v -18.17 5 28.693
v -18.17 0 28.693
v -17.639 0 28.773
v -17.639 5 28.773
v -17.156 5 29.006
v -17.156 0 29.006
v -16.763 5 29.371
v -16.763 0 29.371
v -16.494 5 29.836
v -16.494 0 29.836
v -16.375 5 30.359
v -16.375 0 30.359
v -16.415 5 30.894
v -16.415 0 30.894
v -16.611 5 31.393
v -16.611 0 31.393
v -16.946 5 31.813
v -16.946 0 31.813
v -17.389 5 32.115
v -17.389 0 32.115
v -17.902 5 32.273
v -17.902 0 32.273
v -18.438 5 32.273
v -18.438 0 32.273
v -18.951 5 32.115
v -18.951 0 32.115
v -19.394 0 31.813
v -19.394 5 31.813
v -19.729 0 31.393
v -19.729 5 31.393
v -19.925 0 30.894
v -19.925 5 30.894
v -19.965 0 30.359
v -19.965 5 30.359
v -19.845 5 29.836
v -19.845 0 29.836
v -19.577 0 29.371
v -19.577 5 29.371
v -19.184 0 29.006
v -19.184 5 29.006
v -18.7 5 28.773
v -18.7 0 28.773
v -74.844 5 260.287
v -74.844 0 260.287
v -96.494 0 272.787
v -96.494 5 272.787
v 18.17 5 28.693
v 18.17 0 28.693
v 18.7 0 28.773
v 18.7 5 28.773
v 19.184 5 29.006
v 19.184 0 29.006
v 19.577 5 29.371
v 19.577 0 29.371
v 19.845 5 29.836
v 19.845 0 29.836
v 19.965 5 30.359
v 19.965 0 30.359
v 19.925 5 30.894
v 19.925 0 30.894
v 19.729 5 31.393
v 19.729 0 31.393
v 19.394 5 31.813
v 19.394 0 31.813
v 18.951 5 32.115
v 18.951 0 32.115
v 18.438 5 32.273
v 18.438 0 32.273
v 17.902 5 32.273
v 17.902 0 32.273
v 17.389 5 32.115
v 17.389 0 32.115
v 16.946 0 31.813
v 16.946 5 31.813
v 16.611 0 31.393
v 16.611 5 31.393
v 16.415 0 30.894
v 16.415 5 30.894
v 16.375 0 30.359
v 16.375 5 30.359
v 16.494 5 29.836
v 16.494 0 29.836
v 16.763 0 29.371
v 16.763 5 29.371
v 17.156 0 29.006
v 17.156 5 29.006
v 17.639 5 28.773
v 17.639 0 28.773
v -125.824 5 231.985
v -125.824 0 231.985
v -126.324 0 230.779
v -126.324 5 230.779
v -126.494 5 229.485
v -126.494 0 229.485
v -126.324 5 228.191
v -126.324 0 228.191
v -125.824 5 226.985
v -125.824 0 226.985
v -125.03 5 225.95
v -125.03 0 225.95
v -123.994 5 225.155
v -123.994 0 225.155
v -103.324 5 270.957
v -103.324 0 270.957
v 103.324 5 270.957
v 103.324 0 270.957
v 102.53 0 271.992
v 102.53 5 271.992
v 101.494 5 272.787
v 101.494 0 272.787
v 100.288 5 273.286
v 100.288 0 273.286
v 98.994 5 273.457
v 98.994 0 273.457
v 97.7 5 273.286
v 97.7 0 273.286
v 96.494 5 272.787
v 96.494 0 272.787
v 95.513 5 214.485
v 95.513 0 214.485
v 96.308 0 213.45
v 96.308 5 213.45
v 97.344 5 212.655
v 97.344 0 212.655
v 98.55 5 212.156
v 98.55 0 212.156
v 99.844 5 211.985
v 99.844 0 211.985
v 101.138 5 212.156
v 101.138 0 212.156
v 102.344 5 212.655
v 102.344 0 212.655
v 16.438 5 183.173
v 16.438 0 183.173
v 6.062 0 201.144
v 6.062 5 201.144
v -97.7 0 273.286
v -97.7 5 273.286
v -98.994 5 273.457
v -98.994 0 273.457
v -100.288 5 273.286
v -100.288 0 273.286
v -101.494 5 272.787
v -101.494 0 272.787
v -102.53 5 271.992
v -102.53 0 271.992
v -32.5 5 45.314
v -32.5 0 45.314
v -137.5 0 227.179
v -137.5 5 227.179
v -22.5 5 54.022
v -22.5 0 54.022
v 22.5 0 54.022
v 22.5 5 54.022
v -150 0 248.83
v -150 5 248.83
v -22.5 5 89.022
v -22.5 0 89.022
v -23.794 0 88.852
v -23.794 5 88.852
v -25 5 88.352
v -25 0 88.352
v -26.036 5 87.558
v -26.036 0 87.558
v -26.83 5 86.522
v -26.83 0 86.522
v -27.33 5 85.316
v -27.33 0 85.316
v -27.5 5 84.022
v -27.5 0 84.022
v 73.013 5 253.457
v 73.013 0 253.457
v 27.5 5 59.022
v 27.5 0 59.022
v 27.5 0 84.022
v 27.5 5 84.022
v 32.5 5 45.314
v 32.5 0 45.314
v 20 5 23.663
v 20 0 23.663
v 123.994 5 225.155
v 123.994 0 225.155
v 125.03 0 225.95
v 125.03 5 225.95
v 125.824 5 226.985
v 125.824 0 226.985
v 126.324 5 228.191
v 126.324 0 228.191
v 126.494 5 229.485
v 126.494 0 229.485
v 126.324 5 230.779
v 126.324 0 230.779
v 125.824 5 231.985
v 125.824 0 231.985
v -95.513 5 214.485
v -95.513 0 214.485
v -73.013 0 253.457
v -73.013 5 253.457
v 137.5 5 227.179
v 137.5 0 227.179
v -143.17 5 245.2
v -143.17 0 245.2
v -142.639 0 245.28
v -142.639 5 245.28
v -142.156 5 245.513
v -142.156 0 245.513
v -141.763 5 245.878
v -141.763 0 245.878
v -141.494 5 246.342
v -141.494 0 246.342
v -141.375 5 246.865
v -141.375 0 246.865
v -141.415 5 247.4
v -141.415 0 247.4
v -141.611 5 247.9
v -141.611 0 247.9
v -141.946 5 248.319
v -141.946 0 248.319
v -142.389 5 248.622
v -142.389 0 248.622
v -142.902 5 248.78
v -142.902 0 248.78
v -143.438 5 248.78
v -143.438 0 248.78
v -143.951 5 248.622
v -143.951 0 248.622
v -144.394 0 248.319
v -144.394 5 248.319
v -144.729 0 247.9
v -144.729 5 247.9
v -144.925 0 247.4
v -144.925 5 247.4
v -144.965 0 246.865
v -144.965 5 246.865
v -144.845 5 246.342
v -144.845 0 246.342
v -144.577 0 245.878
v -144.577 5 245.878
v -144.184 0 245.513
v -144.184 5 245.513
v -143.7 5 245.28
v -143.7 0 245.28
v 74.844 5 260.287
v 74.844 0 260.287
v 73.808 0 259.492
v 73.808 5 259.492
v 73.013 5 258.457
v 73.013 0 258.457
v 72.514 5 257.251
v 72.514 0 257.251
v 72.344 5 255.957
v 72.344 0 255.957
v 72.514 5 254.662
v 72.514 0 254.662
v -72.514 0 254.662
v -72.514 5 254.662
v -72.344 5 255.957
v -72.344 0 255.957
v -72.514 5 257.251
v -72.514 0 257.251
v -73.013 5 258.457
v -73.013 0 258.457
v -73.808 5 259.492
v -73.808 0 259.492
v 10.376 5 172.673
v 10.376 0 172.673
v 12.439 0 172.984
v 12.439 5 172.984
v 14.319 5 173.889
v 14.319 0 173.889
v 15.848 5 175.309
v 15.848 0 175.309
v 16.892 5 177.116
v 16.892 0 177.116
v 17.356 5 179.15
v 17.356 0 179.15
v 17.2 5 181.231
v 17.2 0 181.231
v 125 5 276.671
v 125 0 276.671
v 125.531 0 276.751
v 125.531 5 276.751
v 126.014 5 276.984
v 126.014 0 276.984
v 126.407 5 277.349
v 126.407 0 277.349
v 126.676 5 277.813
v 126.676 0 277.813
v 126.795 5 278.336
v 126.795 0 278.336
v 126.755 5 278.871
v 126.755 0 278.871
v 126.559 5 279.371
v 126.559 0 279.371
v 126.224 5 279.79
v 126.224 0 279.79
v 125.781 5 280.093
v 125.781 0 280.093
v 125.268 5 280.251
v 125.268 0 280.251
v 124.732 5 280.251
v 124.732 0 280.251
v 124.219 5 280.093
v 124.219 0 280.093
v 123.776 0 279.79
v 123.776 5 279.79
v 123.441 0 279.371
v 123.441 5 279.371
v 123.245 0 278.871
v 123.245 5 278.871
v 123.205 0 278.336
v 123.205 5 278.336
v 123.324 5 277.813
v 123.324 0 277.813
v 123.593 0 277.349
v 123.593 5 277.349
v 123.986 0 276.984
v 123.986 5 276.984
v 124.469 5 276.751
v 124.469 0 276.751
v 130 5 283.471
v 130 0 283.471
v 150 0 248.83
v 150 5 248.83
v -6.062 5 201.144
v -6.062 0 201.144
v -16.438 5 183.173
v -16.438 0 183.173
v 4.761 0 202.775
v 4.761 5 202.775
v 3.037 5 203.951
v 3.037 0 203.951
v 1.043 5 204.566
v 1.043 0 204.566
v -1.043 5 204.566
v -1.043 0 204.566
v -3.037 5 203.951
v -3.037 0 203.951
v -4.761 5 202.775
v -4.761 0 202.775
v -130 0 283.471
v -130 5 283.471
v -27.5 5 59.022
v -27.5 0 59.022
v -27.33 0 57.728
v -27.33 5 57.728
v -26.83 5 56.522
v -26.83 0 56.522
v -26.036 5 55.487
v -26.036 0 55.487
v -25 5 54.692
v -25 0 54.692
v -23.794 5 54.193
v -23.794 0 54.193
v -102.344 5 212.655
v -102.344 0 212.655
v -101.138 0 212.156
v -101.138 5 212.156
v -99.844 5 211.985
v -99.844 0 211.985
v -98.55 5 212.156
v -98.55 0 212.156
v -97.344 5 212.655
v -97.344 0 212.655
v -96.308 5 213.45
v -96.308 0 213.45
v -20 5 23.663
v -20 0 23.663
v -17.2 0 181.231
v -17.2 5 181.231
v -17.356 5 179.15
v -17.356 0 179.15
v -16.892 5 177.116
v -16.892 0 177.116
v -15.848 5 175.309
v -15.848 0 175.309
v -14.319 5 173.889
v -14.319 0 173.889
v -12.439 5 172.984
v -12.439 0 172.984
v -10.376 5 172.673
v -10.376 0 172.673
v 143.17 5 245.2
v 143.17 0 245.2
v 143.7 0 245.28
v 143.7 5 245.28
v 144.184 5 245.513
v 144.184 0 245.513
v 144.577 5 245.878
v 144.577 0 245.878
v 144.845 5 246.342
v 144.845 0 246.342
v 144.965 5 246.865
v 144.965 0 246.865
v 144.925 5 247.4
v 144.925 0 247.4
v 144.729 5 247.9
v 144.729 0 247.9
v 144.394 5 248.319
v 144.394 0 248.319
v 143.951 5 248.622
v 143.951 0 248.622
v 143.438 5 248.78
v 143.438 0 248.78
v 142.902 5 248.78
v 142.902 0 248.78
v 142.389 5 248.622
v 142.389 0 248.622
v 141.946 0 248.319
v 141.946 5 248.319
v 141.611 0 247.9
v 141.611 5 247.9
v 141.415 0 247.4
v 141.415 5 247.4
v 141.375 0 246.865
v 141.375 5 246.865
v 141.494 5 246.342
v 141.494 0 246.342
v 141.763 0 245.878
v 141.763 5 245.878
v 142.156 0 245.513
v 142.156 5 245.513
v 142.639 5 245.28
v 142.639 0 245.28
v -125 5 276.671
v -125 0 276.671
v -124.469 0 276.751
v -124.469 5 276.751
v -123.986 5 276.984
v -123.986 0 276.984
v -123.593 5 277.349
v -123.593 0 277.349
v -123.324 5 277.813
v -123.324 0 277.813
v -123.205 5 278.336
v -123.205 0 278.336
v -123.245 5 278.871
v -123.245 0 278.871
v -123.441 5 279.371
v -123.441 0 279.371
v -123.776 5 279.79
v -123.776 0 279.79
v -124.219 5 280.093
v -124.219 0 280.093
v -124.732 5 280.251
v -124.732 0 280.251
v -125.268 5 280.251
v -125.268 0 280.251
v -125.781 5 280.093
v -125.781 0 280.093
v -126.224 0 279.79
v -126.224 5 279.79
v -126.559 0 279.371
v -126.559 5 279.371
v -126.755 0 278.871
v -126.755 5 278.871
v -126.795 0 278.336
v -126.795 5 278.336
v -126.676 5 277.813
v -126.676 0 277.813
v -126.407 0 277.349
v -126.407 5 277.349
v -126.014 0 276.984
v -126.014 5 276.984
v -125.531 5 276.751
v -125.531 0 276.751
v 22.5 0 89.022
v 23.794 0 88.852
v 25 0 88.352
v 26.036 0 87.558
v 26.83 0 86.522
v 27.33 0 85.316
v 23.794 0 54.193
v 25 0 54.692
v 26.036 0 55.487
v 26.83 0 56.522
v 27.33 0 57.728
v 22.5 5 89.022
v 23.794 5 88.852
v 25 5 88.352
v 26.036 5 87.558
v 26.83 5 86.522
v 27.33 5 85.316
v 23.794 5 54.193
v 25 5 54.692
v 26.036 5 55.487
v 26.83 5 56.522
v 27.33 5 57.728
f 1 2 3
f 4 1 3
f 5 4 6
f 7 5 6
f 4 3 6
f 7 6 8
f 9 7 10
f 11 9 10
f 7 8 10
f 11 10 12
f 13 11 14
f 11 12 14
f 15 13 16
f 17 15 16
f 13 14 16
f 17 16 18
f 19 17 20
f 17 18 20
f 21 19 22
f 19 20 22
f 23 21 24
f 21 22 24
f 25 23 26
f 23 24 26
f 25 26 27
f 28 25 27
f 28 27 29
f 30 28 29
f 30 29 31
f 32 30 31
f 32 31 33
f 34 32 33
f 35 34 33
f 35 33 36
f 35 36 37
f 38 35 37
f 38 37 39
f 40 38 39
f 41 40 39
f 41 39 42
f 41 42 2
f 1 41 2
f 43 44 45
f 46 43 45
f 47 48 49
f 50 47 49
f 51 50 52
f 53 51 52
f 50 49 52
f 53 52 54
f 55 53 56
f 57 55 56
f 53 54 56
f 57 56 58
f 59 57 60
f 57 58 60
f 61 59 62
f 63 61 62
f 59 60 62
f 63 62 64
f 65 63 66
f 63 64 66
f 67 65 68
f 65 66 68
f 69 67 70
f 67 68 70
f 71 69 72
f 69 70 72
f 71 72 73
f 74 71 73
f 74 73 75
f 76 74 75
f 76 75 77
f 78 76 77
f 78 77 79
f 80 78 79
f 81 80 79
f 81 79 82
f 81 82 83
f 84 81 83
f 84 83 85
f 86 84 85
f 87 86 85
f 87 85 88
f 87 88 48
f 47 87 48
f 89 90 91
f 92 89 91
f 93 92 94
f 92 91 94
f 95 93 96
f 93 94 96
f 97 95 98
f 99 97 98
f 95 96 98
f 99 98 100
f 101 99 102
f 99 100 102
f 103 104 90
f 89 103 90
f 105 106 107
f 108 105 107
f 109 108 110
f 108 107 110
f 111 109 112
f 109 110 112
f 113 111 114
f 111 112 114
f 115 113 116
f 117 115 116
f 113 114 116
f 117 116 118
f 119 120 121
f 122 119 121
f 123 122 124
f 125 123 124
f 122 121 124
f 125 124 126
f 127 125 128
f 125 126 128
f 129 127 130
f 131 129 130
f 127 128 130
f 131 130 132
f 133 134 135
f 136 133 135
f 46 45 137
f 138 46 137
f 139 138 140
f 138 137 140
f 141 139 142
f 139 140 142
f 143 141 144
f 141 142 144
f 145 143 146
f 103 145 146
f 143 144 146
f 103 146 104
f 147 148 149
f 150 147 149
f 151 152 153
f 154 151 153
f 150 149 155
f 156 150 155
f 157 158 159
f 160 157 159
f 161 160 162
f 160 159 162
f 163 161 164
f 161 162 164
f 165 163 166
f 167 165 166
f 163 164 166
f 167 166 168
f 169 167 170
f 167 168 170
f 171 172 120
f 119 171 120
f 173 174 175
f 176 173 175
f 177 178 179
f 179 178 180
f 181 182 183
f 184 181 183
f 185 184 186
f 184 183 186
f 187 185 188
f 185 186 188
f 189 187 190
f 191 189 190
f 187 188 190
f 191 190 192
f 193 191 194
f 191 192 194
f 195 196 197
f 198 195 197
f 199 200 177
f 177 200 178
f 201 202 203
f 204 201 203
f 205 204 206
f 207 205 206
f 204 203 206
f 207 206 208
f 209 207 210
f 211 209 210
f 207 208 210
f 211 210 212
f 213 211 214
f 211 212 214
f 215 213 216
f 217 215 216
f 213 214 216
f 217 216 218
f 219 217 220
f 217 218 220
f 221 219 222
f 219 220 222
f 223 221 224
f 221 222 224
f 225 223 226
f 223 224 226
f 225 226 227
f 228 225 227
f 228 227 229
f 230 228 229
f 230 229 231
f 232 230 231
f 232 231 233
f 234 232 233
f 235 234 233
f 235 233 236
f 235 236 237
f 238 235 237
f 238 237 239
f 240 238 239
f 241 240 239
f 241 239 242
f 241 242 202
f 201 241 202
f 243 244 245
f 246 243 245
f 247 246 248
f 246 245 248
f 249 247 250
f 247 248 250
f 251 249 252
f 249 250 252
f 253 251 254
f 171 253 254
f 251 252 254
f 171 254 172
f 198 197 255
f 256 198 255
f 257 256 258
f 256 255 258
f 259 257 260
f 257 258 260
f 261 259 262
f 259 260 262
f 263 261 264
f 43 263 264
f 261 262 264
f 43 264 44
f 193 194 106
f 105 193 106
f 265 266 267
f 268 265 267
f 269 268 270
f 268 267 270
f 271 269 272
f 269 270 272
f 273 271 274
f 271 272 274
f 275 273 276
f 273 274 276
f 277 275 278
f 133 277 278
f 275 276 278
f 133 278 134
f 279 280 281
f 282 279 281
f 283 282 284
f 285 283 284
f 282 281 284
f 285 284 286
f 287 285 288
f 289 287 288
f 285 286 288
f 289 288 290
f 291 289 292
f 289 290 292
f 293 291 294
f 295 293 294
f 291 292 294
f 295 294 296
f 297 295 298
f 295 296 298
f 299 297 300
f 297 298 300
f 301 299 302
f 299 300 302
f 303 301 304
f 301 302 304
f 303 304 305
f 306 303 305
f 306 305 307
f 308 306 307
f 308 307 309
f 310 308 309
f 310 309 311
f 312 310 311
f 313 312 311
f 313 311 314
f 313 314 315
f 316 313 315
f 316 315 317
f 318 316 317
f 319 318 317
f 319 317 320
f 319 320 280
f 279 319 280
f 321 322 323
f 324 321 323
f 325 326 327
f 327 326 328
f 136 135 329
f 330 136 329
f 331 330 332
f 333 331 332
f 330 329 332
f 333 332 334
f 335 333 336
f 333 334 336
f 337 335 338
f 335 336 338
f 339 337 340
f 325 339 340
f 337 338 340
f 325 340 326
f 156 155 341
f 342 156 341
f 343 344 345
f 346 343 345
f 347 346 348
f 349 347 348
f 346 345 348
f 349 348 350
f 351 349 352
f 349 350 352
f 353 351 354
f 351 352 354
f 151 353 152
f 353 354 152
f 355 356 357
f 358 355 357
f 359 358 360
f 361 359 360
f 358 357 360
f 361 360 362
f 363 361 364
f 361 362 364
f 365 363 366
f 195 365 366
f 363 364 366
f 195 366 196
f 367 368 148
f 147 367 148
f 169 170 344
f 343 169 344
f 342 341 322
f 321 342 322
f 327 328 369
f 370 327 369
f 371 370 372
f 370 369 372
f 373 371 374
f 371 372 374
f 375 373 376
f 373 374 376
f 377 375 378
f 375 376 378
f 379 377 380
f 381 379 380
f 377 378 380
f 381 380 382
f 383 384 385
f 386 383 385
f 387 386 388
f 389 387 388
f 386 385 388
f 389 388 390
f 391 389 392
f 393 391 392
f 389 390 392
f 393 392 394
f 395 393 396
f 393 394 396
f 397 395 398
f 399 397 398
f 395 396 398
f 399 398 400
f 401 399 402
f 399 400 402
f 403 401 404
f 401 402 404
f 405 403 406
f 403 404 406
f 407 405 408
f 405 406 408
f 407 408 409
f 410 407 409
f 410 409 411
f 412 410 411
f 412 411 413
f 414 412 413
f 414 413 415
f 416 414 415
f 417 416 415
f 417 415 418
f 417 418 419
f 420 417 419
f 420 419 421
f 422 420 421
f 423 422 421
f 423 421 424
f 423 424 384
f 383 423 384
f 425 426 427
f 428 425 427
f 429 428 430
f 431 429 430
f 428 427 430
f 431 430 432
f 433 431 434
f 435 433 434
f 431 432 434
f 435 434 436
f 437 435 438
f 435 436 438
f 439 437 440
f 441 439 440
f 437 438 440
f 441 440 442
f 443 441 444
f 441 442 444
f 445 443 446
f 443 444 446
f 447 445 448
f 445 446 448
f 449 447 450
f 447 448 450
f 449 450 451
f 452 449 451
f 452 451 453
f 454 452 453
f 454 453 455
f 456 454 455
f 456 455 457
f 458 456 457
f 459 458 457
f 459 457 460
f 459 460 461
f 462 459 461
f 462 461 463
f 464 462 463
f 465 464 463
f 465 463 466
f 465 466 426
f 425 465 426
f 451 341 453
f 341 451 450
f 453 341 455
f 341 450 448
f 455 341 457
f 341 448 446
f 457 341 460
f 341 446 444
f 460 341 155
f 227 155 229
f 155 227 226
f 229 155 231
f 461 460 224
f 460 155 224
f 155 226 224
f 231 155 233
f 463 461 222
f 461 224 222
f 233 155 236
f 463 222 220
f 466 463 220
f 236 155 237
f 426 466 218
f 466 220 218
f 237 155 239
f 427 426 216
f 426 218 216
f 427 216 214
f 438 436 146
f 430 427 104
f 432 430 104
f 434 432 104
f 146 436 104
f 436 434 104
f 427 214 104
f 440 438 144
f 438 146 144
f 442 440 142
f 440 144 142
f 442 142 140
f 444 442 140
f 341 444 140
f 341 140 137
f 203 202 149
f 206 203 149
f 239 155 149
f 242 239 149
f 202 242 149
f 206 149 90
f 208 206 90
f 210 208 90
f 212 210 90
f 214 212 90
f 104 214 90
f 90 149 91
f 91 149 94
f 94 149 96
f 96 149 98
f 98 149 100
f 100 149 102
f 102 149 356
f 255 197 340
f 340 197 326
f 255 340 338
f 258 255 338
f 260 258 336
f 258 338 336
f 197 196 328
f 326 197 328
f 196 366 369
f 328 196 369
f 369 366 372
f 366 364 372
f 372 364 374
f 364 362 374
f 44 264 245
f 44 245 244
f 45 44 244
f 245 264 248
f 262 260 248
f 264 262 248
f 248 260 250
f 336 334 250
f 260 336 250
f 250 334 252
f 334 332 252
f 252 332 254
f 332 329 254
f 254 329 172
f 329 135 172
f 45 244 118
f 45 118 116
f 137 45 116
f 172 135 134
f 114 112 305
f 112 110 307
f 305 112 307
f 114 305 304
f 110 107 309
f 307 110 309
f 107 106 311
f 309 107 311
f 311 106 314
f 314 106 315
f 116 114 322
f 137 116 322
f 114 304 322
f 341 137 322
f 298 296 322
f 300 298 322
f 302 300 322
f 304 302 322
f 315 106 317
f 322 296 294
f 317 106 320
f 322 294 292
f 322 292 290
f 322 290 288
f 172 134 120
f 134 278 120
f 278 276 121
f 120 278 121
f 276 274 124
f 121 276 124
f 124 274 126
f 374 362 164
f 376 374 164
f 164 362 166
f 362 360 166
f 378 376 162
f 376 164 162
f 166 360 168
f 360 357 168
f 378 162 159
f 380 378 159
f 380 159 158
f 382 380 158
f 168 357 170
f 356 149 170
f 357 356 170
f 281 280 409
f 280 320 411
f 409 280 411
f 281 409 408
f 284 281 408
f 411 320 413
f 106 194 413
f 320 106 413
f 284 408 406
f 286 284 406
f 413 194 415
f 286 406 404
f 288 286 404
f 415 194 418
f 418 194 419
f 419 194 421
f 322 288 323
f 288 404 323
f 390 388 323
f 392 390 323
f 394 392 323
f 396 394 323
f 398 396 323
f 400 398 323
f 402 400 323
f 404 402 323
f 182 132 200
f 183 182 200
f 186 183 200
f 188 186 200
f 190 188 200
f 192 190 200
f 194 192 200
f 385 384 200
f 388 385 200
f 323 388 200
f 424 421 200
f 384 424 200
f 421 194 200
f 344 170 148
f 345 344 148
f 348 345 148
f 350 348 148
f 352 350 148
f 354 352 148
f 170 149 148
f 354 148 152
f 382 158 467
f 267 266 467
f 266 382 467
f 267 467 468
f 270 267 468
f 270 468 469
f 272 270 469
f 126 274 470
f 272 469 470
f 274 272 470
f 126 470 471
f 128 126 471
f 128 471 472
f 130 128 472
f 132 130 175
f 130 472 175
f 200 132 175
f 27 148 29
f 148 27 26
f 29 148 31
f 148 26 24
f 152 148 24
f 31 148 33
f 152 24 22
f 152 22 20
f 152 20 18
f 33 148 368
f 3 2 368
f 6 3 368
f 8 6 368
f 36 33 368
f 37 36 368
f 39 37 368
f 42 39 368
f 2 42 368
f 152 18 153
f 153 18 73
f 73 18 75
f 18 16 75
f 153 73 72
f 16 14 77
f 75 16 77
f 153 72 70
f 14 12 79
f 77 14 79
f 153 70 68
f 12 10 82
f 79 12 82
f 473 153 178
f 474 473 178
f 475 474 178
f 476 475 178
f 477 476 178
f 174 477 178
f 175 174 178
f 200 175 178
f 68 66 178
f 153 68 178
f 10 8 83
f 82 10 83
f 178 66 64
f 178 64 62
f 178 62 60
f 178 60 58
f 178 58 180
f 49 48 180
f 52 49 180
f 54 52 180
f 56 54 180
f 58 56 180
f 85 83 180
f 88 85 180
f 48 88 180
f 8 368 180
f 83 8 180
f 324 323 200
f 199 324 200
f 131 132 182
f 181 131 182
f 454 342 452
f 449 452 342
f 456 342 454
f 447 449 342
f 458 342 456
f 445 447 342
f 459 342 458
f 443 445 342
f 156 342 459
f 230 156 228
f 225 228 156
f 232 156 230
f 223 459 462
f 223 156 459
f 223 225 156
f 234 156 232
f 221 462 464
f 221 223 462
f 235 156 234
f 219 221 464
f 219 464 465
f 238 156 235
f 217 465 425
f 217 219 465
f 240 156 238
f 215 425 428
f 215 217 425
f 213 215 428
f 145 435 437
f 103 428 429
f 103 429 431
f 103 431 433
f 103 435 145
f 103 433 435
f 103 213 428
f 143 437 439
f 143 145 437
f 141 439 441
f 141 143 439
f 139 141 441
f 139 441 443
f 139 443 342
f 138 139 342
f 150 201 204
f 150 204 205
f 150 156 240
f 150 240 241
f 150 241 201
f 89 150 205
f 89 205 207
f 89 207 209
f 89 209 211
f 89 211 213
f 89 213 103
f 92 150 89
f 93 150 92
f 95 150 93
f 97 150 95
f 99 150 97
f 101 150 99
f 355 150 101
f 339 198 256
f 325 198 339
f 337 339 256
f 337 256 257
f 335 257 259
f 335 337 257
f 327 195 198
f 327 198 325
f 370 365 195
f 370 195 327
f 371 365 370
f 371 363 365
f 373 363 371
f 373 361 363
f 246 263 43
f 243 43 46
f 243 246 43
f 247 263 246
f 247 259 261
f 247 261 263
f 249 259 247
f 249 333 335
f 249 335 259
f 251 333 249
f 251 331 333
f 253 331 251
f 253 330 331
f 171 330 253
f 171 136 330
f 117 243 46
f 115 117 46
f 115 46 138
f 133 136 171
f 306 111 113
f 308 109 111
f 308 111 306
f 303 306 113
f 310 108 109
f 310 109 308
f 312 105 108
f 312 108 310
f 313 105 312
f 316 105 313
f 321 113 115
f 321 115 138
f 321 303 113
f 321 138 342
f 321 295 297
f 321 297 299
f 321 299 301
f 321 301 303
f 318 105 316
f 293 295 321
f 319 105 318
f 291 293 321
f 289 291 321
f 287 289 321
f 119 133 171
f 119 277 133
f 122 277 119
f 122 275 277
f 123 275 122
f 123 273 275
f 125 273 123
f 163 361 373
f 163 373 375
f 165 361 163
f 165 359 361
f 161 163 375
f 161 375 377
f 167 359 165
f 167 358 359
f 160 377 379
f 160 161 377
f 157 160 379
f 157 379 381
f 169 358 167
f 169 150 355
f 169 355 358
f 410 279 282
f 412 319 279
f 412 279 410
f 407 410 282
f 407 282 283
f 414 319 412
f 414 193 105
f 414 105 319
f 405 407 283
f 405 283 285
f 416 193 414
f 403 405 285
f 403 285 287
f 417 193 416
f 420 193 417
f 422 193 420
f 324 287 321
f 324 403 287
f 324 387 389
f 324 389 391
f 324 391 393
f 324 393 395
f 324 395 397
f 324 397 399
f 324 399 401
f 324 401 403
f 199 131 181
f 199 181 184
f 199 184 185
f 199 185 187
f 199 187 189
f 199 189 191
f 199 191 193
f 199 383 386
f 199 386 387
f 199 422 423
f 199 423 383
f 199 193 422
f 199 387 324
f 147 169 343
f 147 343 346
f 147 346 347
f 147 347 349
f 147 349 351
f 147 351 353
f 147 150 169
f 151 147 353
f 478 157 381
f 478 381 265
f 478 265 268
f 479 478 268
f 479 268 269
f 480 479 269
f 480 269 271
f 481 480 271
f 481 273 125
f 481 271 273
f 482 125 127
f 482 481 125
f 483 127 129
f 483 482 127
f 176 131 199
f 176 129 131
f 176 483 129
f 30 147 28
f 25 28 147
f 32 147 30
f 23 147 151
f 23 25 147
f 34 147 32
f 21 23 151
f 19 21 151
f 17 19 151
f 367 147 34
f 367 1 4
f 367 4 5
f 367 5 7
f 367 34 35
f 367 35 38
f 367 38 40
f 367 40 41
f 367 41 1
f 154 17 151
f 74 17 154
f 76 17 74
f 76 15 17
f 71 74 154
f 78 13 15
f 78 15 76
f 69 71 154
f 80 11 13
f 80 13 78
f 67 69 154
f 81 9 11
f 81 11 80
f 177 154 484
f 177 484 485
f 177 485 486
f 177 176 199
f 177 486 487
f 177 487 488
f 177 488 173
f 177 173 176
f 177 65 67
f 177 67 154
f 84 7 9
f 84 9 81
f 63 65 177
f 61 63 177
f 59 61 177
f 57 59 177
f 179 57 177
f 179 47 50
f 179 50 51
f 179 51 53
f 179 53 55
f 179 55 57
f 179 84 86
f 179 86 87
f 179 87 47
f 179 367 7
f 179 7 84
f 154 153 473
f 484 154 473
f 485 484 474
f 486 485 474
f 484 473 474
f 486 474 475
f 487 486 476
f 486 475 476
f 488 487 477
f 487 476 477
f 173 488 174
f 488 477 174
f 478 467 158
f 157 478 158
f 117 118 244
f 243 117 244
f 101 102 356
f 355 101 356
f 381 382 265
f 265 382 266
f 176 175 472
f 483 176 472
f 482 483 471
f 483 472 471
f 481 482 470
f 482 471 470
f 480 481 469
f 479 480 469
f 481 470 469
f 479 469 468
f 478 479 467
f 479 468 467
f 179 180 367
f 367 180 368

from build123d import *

# Parameters (mm, degrees)
BOSS_EXTRU_1_DEPTH      = 5
D_GAGEMENT_M31_D        = 3.6
ENL_V_MAT_EXTRU_2_DEPTH = 10


with BuildPart() as part:
    # Esquisse1 → Boss.-Extru.1 (new body)
    with BuildSketch(Plane(origin=(0, 0, 0), x_dir=(1, 0, 0), z_dir=(0, 1, 0))):
        Polygon((-20, -23.663326483), (-32.5, -45.313961578), (-137.5, -227.179296373), (-150, -248.829931467), (-130, -283.470947619), (-105, -283.470947619), (105, -283.470947619), (130, -283.470947619), (150, -248.829931467), (137.5, -227.179296373), (32.5, -45.313961578), (20, -23.663326483), align=None)
        with BuildLine():
            ThreePointArc((-96.494247139, -272.786646223), (-100.288342364, -273.286148335), (-103.324374158, -270.956519204))
            Line((-103.324374158, -270.956519204), (-125.824374158, -231.985376033))
            ThreePointArc((-125.824374158, -231.985376033), (-126.32387627, -228.191280808), (-123.994247139, -225.155249015))
            Line((-123.994247139, -225.155249015), (-102.343612044, -212.655249015))
            ThreePointArc((-102.343612044, -212.655249015), (-98.549516819, -212.155746902), (-95.513485025, -214.485376033))
            Line((-95.513485025, -214.485376033), (-73.013485025, -253.456519204))
            ThreePointArc((-73.013485025, -253.456519204), (-72.513982913, -257.250614429), (-74.843612044, -260.286646223))
            Line((-74.843612044, -260.286646223), (-96.494247139, -272.786646223))
        make_face(mode=Mode.SUBTRACT)
        with BuildLine():
            ThreePointArc((74.843612044, -260.286646223), (72.513982913, -257.250614429), (73.013485025, -253.456519204))
            Line((73.013485025, -253.456519204), (95.513485025, -214.485376033))
            ThreePointArc((95.513485025, -214.485376033), (98.549516819, -212.155746902), (102.343612044, -212.655249015))
            Line((102.343612044, -212.655249015), (123.994247139, -225.155249015))
            ThreePointArc((123.994247139, -225.155249015), (126.32387627, -228.191280808), (125.824374158, -231.985376033))
            Line((125.824374158, -231.985376033), (103.324374158, -270.956519204))
            ThreePointArc((103.324374158, -270.956519204), (100.288342364, -273.286148335), (96.494247139, -272.786646223))
            Line((96.494247139, -272.786646223), (74.843612044, -260.286646223))
        make_face(mode=Mode.SUBTRACT)
        with BuildLine():
            Line((22.5, -89.022310332), (-22.5, -89.022310332))
            ThreePointArc((-22.5, -89.022310332), (-26.035533906, -87.557844238), (-27.5, -84.022310332))
            Line((-27.5, -84.022310332), (-27.5, -59.022310332))
            ThreePointArc((-27.5, -59.022310332), (-26.035533906, -55.486776426), (-22.5, -54.022310332))
            Line((-22.5, -54.022310332), (22.5, -54.022310332))
            ThreePointArc((22.5, -54.022310332), (26.035533906, -55.486776426), (27.5, -59.022310332))
            Line((27.5, -59.022310332), (27.5, -84.022310332))
            ThreePointArc((27.5, -84.022310332), (26.035533906, -87.557844238), (22.5, -89.022310332))
        make_face(mode=Mode.SUBTRACT)
    extrude(amount=BOSS_EXTRU_1_DEPTH)

    # Dégagement M31 (through all)
    with Locations(Plane(origin=(-143.169872981, 5, 246.999804448), x_dir=(0, 0, 1), z_dir=(0, 1, 0))):
        with Locations((0, 0), (31.471143171, 18.169872981), (31.471143171, 268.169872981), (0, 286.339745962), (-216.506350946, 125), (-216.506350946, 161.339745962)):
            Hole(D_GAGEMENT_M31_D / 2)

    # Esquisse6 → Enlèv. mat.-Extru.2 (cut)
    with BuildSketch(Plane(origin=(0, 0, 0), x_dir=(-1, 0, 0), z_dir=(0, -1, 0))):
        with BuildLine():
            Line((-16.437822174, -183.172945427), (-6.062177826, -201.144088597))
            ThreePointArc((-6.062177826, -201.144088597), (0, -204.644088597), (6.062177826, -201.144088597))
            Line((6.062177826, -201.144088597), (16.437822174, -183.172945427))
            ThreePointArc((16.437822174, -183.172945427), (16.437822174, -176.172945427), (10.375644347, -172.672945427))
            Line((10.375644347, -172.672945427), (-10.375644347, -172.672945427))
            ThreePointArc((-10.375644347, -172.672945427), (-16.437822174, -176.172945427), (-16.437822174, -183.172945427))
        make_face()
    extrude(amount=-ENL_V_MAT_EXTRU_2_DEPTH, mode=Mode.SUBTRACT)


solid = part.part
